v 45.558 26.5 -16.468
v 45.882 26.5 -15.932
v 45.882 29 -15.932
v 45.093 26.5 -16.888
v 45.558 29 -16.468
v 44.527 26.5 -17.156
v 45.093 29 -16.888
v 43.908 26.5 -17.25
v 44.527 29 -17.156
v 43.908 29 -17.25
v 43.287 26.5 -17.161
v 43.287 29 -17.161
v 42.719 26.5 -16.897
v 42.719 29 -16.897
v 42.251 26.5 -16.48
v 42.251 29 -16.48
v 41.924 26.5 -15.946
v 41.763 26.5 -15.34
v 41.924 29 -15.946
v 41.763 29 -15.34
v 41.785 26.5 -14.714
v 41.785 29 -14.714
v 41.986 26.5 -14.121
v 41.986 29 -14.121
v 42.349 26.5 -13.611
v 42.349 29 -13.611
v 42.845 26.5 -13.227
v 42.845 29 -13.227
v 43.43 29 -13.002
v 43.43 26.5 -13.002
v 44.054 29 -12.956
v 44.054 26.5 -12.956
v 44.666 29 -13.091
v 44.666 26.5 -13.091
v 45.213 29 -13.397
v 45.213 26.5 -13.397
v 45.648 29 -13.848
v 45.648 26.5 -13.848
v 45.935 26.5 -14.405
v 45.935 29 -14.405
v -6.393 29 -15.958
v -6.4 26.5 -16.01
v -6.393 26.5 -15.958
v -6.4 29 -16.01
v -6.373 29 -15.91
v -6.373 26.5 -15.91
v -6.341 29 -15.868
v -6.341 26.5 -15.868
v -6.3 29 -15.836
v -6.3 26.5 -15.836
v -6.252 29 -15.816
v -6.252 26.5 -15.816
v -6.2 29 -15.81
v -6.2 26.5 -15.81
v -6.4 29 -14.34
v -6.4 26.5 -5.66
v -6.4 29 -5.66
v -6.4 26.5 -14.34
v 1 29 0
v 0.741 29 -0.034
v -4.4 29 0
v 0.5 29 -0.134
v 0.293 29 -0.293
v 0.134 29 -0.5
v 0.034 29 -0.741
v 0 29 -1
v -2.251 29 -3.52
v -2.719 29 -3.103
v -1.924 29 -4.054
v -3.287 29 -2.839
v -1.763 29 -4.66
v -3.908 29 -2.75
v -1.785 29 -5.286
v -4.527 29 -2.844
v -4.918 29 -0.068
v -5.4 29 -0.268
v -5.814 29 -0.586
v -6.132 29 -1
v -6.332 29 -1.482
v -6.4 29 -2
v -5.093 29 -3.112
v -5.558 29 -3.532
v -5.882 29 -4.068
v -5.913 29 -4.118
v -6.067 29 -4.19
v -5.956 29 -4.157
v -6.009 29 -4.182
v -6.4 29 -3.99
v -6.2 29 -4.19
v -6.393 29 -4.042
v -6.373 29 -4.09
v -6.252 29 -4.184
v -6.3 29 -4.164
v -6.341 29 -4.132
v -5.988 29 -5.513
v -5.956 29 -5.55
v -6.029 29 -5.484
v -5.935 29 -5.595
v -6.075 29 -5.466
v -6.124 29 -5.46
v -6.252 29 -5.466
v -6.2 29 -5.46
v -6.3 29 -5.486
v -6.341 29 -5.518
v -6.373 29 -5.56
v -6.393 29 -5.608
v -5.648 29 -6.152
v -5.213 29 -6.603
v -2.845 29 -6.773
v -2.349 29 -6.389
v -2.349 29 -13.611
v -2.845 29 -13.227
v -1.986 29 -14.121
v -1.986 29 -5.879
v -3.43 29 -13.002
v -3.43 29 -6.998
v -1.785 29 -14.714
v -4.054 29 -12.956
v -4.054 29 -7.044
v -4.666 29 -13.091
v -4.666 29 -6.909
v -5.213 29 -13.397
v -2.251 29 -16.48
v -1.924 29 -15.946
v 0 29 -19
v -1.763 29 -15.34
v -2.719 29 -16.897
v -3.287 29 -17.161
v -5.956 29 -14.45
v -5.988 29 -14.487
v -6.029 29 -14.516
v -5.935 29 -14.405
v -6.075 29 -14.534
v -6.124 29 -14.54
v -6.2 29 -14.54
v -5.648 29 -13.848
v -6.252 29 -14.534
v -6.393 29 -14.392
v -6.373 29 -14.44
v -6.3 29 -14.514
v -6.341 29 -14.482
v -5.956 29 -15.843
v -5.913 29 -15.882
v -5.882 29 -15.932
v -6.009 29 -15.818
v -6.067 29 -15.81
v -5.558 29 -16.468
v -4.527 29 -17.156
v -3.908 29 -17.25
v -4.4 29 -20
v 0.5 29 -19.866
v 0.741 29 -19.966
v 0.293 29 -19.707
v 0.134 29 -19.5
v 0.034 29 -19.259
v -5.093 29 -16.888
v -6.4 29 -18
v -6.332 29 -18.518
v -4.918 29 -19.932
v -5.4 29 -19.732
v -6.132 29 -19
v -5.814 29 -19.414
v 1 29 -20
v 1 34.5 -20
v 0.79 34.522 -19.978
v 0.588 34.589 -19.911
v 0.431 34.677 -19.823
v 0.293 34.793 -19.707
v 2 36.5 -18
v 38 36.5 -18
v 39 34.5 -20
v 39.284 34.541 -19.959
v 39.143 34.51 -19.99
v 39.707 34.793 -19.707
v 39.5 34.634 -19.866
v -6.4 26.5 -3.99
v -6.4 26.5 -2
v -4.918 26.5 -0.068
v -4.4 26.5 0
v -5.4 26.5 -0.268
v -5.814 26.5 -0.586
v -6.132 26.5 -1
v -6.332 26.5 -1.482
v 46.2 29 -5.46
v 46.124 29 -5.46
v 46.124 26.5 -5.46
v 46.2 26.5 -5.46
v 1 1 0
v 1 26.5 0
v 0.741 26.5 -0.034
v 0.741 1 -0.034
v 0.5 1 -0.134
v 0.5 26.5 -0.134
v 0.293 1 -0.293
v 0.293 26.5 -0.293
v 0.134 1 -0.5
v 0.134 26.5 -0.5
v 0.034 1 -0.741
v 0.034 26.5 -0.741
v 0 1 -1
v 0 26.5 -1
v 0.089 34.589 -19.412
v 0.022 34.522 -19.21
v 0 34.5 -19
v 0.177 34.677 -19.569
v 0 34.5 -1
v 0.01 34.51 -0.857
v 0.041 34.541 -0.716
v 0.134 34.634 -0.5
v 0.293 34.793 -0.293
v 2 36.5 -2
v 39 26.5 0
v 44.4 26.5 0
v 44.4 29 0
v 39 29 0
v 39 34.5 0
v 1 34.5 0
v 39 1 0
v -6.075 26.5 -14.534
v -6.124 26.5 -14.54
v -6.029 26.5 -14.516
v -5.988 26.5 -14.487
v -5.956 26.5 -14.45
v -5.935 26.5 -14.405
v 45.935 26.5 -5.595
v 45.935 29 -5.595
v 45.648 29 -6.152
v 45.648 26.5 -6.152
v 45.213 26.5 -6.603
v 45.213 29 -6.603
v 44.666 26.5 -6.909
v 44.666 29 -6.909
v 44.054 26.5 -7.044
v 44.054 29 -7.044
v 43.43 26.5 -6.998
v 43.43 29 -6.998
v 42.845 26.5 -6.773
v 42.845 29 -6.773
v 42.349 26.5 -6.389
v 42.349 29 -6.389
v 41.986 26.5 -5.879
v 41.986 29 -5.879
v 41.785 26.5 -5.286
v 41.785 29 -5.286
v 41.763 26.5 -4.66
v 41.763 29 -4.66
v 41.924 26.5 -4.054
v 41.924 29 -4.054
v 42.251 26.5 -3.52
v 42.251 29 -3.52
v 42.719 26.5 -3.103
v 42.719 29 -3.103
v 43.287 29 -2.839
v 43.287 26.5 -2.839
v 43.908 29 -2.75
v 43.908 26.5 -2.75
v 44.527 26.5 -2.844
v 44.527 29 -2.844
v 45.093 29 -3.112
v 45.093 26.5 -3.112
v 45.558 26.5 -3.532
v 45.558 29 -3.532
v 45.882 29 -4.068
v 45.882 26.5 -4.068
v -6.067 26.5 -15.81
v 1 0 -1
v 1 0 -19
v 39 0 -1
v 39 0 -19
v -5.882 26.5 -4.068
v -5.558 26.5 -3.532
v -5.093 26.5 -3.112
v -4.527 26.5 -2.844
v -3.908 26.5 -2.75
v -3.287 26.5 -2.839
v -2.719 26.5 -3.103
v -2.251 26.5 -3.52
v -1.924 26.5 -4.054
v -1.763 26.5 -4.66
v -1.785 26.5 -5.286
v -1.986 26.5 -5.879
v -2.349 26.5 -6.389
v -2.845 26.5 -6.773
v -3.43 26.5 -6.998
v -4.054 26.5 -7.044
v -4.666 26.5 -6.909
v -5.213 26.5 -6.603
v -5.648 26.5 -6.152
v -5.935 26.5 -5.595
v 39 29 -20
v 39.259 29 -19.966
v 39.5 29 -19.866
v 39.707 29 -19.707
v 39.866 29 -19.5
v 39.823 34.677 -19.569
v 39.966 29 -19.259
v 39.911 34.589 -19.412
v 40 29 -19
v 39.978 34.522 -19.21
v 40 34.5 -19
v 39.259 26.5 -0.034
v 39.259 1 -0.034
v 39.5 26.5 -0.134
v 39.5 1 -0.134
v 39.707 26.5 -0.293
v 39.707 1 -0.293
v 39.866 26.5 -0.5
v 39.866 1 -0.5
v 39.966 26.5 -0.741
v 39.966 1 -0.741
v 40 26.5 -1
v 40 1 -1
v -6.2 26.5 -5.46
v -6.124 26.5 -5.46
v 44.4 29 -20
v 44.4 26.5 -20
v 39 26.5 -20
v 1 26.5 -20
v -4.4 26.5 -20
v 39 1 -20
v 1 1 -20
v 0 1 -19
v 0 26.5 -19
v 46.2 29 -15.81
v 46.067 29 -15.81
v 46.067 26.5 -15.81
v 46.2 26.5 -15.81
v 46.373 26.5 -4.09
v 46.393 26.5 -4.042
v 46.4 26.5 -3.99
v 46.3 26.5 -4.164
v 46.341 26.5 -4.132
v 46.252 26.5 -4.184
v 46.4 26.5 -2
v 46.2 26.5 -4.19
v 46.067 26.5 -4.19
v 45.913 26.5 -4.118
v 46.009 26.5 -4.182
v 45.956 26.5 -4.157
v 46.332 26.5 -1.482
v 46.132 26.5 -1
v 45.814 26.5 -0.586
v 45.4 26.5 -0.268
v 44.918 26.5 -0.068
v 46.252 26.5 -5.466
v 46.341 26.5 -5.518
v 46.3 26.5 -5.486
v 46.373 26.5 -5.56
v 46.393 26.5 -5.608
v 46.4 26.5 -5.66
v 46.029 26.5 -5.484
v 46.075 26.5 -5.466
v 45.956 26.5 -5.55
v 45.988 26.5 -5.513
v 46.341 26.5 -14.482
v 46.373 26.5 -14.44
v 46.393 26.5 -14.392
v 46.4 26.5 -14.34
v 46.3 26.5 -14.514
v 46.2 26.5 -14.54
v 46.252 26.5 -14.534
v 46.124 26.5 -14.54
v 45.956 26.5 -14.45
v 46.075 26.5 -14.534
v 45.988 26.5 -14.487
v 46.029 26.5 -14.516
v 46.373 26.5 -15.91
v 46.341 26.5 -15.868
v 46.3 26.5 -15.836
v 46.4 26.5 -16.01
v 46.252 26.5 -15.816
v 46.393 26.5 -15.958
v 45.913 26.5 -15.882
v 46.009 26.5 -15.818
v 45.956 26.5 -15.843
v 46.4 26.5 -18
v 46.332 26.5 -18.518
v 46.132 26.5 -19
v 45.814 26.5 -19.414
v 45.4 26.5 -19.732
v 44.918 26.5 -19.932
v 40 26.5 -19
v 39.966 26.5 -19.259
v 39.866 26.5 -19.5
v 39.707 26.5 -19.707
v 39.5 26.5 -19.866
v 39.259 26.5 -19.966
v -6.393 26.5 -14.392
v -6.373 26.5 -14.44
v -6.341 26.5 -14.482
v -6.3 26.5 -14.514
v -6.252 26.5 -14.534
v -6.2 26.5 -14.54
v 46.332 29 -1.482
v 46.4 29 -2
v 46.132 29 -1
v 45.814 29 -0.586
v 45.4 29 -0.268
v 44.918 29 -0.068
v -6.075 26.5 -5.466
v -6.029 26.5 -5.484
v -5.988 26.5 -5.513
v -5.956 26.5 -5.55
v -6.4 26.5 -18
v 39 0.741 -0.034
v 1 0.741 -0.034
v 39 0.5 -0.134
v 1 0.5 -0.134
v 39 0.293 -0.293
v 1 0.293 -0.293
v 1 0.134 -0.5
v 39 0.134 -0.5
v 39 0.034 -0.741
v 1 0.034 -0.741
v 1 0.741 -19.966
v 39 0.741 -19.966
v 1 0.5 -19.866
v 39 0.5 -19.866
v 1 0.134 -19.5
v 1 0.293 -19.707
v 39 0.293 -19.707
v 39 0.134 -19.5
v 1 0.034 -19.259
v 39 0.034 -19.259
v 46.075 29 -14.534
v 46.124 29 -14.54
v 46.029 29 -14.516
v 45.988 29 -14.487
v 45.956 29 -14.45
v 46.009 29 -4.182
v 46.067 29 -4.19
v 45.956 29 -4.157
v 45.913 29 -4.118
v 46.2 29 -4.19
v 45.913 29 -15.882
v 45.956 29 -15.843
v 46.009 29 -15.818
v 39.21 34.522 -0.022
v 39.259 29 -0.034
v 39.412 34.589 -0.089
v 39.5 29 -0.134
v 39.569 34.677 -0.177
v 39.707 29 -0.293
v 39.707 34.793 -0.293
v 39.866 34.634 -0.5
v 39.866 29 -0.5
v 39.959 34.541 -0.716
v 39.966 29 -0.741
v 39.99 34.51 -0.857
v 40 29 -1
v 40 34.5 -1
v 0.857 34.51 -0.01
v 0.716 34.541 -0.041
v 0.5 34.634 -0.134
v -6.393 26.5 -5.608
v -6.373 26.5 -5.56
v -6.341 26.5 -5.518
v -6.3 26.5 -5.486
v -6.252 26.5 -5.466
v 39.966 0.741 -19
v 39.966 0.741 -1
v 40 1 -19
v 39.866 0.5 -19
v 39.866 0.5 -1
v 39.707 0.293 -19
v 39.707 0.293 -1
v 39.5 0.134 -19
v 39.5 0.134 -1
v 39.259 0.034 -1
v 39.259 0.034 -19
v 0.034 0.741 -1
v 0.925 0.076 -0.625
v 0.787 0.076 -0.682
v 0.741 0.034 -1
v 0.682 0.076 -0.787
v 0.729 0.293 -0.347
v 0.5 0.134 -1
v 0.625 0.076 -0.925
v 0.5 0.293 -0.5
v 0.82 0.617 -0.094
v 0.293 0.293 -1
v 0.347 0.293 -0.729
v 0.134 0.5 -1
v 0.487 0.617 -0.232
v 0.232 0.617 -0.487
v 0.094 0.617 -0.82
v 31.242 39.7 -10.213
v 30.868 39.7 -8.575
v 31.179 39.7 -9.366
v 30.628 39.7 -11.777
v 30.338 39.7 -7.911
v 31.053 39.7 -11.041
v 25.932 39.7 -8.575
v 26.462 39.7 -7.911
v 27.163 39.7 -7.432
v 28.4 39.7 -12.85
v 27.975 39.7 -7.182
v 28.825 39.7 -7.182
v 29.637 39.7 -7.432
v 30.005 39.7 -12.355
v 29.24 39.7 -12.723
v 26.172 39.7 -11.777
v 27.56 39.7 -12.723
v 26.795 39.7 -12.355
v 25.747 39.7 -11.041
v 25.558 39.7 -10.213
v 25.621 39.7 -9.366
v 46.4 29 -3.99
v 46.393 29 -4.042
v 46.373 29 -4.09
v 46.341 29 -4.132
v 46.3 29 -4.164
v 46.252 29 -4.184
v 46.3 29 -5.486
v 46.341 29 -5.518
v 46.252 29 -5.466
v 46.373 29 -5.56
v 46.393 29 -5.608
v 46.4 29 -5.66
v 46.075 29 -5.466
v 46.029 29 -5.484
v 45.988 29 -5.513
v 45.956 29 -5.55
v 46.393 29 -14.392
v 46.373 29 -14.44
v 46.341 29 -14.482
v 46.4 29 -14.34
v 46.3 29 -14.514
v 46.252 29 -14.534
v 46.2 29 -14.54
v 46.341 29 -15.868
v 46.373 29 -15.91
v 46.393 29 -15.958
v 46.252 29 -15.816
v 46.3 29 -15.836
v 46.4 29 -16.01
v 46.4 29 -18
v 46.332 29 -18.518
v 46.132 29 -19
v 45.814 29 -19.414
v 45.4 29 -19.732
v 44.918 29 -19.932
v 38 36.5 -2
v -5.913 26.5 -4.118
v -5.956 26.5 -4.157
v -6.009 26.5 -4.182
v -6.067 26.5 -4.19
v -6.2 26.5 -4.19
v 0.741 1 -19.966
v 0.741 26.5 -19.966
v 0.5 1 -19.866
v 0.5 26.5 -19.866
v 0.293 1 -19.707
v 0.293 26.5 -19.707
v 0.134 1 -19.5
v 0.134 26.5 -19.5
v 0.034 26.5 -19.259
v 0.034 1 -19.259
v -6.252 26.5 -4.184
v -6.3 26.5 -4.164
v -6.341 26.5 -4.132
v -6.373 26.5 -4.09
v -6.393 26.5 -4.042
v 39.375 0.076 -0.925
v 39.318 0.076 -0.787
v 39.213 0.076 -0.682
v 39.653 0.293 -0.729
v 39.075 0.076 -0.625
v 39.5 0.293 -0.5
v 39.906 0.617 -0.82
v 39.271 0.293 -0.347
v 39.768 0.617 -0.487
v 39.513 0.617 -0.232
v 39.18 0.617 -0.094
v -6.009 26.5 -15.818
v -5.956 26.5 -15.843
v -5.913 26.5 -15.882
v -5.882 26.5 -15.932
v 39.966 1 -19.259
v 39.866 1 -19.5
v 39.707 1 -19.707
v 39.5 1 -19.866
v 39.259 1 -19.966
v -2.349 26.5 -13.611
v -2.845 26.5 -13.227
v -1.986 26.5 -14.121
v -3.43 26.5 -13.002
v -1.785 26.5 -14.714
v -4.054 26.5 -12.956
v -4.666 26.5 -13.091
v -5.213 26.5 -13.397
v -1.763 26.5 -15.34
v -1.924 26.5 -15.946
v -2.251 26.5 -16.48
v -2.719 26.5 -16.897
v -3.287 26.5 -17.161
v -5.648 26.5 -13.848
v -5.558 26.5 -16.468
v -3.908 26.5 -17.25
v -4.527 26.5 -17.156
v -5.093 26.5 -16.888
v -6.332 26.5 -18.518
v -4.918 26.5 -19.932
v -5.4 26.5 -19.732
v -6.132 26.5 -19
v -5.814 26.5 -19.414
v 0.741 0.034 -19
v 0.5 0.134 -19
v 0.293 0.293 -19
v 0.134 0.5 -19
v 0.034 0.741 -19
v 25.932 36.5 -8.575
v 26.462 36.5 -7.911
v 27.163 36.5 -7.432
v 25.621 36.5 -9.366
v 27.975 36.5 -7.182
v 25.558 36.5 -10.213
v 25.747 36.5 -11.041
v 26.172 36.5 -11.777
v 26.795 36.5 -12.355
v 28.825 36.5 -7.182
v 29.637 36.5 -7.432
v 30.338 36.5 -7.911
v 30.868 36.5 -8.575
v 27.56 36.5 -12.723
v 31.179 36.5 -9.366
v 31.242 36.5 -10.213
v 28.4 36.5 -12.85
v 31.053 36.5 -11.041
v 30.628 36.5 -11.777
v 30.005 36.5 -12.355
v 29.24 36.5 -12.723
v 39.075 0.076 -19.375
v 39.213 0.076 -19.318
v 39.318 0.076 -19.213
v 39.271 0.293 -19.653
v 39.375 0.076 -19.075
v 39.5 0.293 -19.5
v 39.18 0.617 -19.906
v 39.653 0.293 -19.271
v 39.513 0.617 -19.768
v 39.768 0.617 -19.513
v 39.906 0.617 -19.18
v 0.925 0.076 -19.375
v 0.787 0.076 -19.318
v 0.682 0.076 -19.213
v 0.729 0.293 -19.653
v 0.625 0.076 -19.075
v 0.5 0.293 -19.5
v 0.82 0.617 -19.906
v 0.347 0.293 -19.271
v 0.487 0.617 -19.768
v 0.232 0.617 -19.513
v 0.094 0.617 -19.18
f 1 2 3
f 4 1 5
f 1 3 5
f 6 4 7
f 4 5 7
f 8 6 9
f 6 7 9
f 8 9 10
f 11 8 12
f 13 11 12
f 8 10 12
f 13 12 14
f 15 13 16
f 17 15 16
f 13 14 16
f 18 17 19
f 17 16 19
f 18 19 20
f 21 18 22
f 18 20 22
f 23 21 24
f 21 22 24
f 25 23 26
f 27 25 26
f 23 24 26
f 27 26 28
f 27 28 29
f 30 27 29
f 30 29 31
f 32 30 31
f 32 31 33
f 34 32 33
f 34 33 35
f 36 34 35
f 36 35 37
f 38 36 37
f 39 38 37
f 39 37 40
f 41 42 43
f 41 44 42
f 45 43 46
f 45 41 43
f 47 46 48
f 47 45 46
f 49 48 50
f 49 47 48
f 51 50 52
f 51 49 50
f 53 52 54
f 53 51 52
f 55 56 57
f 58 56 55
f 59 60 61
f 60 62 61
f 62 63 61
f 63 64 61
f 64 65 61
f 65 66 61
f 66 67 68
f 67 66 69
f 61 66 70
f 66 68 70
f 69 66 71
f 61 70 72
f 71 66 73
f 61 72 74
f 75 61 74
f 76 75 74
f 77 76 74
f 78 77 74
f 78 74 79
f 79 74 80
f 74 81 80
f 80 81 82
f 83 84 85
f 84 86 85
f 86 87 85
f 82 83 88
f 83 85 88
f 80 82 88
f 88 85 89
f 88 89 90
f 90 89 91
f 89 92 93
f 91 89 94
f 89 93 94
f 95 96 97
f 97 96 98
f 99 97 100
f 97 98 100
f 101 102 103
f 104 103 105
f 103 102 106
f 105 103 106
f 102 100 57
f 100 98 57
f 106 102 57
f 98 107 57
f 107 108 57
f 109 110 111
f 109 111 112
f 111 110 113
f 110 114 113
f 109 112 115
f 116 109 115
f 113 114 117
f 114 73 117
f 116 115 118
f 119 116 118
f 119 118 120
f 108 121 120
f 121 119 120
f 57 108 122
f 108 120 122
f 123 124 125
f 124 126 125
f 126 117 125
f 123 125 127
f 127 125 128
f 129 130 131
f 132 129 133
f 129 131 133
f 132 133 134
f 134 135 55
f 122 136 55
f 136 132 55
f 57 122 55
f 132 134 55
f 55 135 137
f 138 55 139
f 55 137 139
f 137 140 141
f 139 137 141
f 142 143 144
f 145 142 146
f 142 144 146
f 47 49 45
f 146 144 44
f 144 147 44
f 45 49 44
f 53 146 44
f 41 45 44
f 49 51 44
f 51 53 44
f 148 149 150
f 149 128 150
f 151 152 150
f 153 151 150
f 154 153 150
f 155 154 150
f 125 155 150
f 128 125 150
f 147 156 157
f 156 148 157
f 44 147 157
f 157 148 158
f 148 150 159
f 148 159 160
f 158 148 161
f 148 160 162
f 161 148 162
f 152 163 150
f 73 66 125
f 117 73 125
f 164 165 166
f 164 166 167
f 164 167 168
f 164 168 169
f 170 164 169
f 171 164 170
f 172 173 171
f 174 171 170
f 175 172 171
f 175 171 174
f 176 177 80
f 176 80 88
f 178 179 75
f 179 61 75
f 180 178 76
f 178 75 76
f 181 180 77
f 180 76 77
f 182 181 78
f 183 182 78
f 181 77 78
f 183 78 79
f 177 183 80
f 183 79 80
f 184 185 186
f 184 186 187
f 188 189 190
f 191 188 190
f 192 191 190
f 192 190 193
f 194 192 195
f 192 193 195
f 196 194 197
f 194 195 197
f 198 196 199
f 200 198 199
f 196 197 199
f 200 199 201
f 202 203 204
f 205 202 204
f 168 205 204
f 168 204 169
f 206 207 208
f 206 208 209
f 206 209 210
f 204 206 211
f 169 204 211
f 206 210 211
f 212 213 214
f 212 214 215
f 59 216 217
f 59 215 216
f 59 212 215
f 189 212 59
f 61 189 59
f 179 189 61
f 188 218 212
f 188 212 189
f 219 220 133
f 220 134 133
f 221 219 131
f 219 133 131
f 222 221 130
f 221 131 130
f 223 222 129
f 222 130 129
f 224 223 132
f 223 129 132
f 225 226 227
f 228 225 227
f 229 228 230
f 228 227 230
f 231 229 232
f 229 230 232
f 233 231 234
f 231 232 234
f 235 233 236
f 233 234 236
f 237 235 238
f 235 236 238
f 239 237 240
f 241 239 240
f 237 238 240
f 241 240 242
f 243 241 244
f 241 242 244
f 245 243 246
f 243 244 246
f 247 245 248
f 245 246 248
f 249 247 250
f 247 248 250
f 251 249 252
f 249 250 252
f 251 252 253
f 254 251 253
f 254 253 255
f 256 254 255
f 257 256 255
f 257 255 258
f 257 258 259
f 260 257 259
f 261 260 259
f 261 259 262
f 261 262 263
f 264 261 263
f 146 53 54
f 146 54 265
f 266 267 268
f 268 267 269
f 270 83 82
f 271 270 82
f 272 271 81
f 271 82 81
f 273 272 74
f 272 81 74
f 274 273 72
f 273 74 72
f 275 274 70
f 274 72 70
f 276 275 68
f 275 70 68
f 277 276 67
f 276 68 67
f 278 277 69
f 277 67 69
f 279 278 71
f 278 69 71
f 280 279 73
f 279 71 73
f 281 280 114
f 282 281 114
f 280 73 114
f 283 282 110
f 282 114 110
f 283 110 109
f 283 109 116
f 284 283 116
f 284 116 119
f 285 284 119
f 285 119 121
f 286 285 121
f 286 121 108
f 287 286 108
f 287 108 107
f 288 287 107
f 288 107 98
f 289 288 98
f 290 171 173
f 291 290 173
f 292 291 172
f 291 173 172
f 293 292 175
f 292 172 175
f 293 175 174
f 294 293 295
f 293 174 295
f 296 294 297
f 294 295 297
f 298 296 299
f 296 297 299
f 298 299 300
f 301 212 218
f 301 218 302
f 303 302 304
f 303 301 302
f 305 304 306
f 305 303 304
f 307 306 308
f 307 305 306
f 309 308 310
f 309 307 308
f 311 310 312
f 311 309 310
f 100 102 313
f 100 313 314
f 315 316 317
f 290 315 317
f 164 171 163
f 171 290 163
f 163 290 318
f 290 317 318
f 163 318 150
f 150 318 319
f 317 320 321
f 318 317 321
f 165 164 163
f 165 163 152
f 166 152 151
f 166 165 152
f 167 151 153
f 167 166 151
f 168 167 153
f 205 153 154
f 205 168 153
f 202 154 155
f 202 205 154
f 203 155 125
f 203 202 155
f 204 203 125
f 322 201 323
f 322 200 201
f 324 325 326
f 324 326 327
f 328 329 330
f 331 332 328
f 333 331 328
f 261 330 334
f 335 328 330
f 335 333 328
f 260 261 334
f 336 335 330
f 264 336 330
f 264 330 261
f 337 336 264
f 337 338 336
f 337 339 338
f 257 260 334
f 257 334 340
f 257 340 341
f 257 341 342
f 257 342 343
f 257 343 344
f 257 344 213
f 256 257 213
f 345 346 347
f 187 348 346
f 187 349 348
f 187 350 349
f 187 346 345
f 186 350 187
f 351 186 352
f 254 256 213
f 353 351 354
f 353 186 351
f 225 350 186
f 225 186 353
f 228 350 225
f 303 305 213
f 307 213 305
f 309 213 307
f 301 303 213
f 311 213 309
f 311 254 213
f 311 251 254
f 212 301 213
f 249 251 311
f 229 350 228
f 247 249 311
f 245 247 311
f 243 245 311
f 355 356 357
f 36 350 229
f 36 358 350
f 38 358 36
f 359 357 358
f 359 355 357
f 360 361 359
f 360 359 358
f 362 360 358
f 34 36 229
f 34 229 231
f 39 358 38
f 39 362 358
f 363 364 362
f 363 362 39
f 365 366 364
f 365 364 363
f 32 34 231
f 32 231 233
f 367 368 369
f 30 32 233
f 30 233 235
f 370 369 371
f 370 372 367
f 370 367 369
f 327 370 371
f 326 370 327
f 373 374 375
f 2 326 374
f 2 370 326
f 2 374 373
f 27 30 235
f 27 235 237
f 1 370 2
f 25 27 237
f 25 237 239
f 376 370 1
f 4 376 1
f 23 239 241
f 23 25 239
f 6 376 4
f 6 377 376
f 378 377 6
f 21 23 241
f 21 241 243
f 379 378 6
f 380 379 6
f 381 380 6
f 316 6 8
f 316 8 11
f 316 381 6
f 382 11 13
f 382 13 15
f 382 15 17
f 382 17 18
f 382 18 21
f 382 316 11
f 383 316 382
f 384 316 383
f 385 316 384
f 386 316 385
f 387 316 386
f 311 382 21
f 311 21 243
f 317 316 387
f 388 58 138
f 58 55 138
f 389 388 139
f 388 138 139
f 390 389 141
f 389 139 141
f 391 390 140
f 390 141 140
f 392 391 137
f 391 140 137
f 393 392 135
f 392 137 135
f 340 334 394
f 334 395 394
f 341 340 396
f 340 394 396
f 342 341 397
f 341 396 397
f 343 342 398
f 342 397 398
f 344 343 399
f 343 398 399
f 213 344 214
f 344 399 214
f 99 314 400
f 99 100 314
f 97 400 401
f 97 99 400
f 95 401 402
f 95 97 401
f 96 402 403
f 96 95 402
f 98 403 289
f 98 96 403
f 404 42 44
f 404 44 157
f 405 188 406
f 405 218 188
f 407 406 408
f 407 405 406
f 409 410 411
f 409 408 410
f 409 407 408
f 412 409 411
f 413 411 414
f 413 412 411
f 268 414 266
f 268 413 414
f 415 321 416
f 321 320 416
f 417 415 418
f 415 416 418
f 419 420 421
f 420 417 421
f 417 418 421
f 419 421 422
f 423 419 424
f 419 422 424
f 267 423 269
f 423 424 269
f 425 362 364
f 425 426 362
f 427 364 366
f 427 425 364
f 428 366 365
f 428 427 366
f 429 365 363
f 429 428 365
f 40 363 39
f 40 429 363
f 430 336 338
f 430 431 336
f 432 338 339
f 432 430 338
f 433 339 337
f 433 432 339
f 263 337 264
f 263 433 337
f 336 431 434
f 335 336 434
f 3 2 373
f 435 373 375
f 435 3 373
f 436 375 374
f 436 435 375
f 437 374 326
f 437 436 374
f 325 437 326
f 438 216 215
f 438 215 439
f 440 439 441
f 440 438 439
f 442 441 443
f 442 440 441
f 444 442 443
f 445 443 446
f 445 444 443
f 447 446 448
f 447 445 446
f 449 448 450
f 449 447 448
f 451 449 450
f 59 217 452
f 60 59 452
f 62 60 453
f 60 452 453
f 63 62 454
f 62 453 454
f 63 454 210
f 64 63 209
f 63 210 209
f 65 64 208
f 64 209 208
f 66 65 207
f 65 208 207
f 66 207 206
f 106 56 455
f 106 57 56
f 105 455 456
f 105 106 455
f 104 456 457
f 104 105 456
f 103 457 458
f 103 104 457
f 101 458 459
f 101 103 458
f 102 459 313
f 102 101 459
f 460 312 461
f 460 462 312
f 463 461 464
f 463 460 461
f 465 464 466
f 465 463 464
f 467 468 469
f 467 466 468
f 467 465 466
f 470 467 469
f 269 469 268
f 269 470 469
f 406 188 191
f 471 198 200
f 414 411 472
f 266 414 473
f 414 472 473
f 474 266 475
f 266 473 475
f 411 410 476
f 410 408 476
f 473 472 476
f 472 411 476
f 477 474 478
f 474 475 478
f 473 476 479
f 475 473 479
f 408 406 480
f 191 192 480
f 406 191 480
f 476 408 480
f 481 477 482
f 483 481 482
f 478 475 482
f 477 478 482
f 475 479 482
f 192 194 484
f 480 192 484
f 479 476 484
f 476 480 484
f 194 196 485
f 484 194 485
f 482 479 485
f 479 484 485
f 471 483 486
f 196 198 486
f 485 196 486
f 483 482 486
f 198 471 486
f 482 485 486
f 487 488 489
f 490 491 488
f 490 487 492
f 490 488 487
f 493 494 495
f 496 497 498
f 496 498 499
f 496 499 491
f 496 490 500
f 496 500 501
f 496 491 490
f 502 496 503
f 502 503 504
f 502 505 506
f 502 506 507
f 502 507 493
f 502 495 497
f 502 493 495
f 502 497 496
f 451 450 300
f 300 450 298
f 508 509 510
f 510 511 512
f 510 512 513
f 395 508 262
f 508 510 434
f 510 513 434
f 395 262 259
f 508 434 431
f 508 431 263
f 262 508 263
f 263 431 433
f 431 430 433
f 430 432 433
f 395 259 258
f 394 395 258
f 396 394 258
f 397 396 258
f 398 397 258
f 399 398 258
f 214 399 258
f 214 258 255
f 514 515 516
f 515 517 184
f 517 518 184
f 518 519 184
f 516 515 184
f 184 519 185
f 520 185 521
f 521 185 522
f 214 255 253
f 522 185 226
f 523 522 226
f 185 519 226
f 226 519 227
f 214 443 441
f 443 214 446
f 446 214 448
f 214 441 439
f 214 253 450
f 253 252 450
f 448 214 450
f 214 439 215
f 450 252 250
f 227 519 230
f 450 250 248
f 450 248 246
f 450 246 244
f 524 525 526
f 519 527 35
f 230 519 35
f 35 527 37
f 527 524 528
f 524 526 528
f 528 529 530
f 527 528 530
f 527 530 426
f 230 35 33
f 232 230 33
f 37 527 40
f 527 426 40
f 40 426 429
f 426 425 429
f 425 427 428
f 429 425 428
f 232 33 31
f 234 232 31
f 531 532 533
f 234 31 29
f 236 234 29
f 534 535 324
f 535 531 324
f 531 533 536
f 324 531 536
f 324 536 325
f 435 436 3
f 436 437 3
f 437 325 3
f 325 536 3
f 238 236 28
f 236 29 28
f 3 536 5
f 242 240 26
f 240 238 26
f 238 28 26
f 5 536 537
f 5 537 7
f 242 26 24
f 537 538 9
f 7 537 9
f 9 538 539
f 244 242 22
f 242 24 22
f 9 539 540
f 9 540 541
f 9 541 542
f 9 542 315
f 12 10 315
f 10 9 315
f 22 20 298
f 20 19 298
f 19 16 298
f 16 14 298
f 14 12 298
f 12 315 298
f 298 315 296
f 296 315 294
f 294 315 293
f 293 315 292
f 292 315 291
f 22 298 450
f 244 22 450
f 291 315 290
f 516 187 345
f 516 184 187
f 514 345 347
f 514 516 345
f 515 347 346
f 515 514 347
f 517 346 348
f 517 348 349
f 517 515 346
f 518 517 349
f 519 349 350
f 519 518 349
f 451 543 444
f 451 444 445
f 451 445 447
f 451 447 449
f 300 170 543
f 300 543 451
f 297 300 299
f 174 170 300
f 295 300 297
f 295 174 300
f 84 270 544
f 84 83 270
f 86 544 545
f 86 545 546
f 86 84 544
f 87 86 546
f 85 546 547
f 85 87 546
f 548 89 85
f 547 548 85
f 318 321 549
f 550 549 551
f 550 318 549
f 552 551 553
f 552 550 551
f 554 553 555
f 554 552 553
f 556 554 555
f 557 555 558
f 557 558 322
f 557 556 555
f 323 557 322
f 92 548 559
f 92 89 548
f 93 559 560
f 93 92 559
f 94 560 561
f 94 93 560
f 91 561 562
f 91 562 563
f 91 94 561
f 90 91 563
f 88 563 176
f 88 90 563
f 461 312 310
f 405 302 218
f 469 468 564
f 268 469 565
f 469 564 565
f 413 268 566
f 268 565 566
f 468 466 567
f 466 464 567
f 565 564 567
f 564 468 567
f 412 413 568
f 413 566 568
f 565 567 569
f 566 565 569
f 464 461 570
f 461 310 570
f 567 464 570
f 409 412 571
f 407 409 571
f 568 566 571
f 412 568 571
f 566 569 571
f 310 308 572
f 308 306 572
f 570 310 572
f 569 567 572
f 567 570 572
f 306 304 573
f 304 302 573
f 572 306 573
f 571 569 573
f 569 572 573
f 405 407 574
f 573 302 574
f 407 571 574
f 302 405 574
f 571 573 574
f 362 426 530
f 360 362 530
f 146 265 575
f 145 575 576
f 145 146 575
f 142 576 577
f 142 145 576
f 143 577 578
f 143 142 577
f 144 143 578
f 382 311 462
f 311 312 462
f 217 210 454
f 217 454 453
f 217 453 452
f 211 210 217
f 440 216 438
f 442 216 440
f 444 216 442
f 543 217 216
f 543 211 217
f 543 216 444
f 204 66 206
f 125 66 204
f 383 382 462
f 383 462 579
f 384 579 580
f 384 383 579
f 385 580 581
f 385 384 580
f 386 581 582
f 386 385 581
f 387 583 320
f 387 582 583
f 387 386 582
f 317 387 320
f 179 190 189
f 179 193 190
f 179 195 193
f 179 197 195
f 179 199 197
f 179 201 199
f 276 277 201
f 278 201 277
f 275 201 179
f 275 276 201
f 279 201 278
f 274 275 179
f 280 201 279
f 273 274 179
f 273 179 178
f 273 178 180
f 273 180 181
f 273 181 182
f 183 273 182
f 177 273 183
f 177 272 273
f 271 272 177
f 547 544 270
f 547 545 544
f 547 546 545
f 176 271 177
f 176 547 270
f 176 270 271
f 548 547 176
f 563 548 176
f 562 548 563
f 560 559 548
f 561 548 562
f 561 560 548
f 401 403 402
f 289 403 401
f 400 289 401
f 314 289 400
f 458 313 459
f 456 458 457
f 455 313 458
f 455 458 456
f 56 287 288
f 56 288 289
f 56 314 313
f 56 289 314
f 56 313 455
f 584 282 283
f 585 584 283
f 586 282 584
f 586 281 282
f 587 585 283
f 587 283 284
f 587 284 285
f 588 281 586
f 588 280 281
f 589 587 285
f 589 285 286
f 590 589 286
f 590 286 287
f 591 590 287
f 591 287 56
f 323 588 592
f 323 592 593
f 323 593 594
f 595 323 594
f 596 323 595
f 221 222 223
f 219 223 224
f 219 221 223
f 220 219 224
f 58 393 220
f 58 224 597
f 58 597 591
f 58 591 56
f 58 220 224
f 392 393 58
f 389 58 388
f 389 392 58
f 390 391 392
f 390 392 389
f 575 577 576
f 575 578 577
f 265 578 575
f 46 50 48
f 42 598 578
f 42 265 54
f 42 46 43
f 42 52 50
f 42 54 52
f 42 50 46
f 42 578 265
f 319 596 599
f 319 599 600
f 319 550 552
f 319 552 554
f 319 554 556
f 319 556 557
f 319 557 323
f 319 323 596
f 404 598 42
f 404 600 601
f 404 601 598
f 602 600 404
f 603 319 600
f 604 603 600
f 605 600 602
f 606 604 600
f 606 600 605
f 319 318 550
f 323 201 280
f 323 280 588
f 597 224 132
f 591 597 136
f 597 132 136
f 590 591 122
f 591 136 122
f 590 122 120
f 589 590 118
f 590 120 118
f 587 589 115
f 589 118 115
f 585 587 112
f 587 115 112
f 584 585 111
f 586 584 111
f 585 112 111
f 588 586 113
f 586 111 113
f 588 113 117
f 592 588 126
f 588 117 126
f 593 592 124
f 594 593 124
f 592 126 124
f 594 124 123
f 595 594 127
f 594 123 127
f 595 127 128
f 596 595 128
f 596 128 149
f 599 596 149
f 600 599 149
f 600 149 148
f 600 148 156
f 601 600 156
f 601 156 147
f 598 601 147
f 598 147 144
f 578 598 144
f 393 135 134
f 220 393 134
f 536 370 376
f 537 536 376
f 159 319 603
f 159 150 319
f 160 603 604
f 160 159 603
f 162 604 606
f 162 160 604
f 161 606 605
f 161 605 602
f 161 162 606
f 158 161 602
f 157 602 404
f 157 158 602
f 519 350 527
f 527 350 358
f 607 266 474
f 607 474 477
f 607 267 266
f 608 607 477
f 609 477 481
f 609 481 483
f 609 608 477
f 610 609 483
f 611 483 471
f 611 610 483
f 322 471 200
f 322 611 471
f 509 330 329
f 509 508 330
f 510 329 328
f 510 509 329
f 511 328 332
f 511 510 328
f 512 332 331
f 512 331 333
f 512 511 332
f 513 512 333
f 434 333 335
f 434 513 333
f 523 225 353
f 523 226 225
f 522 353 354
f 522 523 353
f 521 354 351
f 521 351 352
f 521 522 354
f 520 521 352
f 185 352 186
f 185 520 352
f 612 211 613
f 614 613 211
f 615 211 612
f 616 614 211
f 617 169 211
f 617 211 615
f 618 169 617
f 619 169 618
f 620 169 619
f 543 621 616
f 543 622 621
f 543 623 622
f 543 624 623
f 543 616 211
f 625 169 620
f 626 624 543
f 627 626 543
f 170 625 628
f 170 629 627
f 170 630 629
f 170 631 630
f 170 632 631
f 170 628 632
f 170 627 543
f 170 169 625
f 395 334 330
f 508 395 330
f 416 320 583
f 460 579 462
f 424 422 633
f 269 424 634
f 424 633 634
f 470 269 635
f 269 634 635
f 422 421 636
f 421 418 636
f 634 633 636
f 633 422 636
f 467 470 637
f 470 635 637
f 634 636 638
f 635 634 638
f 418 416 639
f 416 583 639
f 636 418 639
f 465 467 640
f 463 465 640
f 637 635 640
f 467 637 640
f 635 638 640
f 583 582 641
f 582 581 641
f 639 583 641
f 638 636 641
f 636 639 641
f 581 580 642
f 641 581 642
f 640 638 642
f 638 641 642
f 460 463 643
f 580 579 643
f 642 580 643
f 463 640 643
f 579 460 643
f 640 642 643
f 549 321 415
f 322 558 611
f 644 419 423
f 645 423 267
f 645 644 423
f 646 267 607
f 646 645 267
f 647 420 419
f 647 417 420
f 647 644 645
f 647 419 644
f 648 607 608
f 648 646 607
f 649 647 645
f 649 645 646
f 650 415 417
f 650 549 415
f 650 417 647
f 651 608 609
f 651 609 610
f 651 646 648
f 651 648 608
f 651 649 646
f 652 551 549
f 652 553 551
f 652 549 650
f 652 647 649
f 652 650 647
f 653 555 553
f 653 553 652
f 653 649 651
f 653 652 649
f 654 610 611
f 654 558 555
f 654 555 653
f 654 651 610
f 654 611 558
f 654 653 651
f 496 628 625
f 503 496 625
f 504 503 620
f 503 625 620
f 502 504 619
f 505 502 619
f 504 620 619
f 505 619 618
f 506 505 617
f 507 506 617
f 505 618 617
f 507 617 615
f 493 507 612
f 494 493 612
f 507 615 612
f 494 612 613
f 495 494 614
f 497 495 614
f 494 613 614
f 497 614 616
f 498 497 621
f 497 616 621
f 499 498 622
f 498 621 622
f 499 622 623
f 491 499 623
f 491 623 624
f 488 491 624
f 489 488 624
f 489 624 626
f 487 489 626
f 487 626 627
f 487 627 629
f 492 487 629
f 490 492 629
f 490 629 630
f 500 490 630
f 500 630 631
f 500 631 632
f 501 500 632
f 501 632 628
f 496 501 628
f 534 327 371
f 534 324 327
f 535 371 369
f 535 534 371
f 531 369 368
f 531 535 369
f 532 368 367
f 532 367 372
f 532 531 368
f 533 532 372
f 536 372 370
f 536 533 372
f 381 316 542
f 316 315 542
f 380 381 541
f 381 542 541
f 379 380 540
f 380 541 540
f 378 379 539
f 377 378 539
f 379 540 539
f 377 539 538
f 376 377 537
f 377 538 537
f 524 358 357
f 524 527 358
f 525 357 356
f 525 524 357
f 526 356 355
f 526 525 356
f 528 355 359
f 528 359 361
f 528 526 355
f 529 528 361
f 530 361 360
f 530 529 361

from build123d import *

# Parameters (mm, degrees)
SKETCH_1_W           = 40
SKETCH_1_H           = 20
EXTRUDE_1_DEPTH      = 36.5
SKETCH_2_W           = 52.8
SKETCH_2_H           = 20
EXTRUDE_2_DEPTH      = 2.5
SKETCH_3_R           = 2.15
CUT_EXTRUDE_1_DEPTH  = 4.15
SKETCH_4_W           = 1.589858097
SKETCH_4_H           = 1.269072198
CUT_EXTRUDE_2_DEPTH  = 4.15
FILLET_2_R           = 2
FILLET_3_R           = 1
FILLET_7_R           = 0.2
FILLET_8_R           = 0.2
FILLET_START         = 38.537319575
FILLET_3_2_OUTLINE_W = 42
FILLET_3_2_OUTLINE_H = 6
FILLET_3_2_DEPTH     = 2.462680425
FILLET_START_2       = 24.395183951
FILLET_4_OUTLINE_W   = 42
FILLET_4_OUTLINE_H   = 6
FILLET_4_DEPTH       = 2.604816049
FILLET_START_3       = 52.679455198
FILLET_5_OUTLINE_W   = 5
FILLET_5_OUTLINE_H   = 22
FILLET_5_DEPTH       = 2.320544802
FILLET_START_4       = -27
FILLET_6_OUTLINE_W   = 6
FILLET_6_OUTLINE_H   = 22
FILLET_6_DEPTH       = 2.604816049
SKETCH_5_R           = 2.85
EXTRUDE_3_DEPTH      = 5
CUT_EXTRUDE_START    = -1.8
SKETCH_6_R           = 2.85
CUT_EXTRUDE_3_DEPTH  = 1.8


with BuildPart() as part:
    # 草图1 → 凸台-拉伸1 (new body)
    with BuildSketch(Plane(origin=(0, 0, 0), x_dir=(1, 0, 0), z_dir=(0, 1, 0))):
        with Locations((20, 10)):
            Rectangle(SKETCH_1_W, SKETCH_1_H)
    extrude(amount=EXTRUDE_1_DEPTH)

    # 草图2 → 凸台-拉伸2 (add)
    with BuildSketch(Plane(origin=(0, 26.5, 0), x_dir=(-1, 0, 0), z_dir=(0, -1, 0))):
        with Locations((-20, 10)):
            Rectangle(SKETCH_2_W, SKETCH_2_H)
    extrude(amount=-EXTRUDE_2_DEPTH)

    # 草图3 → 切除-拉伸1 (cut)
    with BuildSketch(Plane(origin=(0, 29, 0), x_dir=(1, 0, 0), z_dir=(0, 1, 0))):
        with Locations(Location((43.9, 15.1, 0), (0, 0, 270))):
            Circle(SKETCH_3_R)
        with Locations(Location((43.9, 4.9, 0), (0, 0, 270))):
            Circle(SKETCH_3_R)
        with Locations(Location((-3.9, 15.1, 0), (0, 0, 270))):
            Circle(SKETCH_3_R)
        with Locations(Location((-3.9, 4.9, 0), (0, 0, 270))):
            Circle(SKETCH_3_R)
    extrude(amount=-CUT_EXTRUDE_1_DEPTH, mode=Mode.SUBTRACT)

    # 草图4 → 切除-拉伸2 (cut)
    with BuildSketch(Plane(origin=(0, 29, 0), x_dir=(1, 0, 0), z_dir=(0, 1, 0))):
        with Locations((-6.117219692, 15.174989867)):
            Rectangle(SKETCH_4_W, SKETCH_4_H)
        with Locations((46.117219692, 15.174989867)):
            Rectangle(SKETCH_4_W, SKETCH_4_H)
        with Locations((46.117219692, 4.825010133)):
            Rectangle(SKETCH_4_W, SKETCH_4_H)
        with Locations((-6.117219692, 4.825010133)):
            Rectangle(SKETCH_4_W, SKETCH_4_H)
    extrude(amount=-CUT_EXTRUDE_2_DEPTH, mode=Mode.SUBTRACT)

    # 圆角2
    fillet_2_edges = [part.edges().sort_by_distance(p)[0] for p in [
        (46.4, 27.75, -20),
        (-6.4, 27.75, 0),
        (46.4, 27.75, 0),
        (-6.4, 27.75, -20),
    ]]
    fillet(fillet_2_edges, radius=FILLET_2_R)

    # Fillet 3
    fillet_3_edges = [part.edges().sort_by_distance(p)[0] for p in [
        (0, 13.25, -20),
        (40, 13.25, -20),
        (40, 13.25, 0),
        (0, 13.25, 0),
        (20, 0, -20),
        (40, 0, -10),
        (20, 0, 0),
        (0, 0, -10),
        (0, 32.75, -20),
        (40, 32.75, -20),
        (40, 32.75, 0),
        (0, 32.75, 0),
    ]]
    fillet(fillet_3_edges, radius=FILLET_3_R)

    # 圆角7
    fillet_7_edges = [part.edges().sort_by_distance(p)[0] for p in [
        (46.4, 27.75, -4.190474034),
        (46.4, 27.75, -5.459546232),
        (45.97591137, 27.75, -5.459546232),
        (45.929549926, 27.75, -4.190474034),
        (45.97591137, 27.75, -14.540453768),
        (45.929549926, 27.75, -15.809525966),
        (-5.97591137, 27.75, -5.459546232),
        (-5.929549926, 27.75, -4.190474034),
        (46.4, 27.75, -15.809525966),
        (46.4, 27.75, -14.540453768),
        (-6.4, 27.75, -4.190474034),
        (-6.4, 27.75, -5.459546232),
    ]]
    fillet(fillet_7_edges, radius=FILLET_7_R)

    # 圆角8
    fillet_8_edges = [part.edges().sort_by_distance(p)[0] for p in [
        (-6.4, 27.75, -14.540453768),
        (-6.4, 27.75, -15.809525966),
        (-5.929549926, 27.75, -15.809525966),
        (-5.97591137, 27.75, -14.540453768),
    ]]
    fillet(fillet_8_edges, radius=FILLET_8_R)

    # Fillet 3 2: read off the stored shape, not the designer's step
    # Fillet 3 2 outline → Fillet 3 2 (cut)
    with BuildSketch(Plane(origin=(0, 0, 0), x_dir=(1, 0, 0), z_dir=(0, 0.707106781186547, -0.707106781186548)).offset(FILLET_START)):
        with Locations((20, -12)):
            Rectangle(FILLET_3_2_OUTLINE_W, FILLET_3_2_OUTLINE_H)
    extrude(amount=FILLET_3_2_DEPTH, mode=Mode.SUBTRACT)

    # 倒角4: read off the stored shape, not the designer's step
    # 倒角4 outline → 倒角4 (cut)
    with BuildSketch(Plane(origin=(0, 0, 0), x_dir=(1, 0, 0), z_dir=(0, 0.707106781186547, 0.707106781186548)).offset(FILLET_START_2)):
        with Locations((20, 26)):
            Rectangle(FILLET_4_OUTLINE_W, FILLET_4_OUTLINE_H)
    extrude(amount=FILLET_4_DEPTH, mode=Mode.SUBTRACT)

    # 倒角5: read off the stored shape, not the designer's step
    # 倒角5 outline → 倒角5 (cut)
    with BuildSketch(Plane(origin=(0, 0, 0), x_dir=(0.707106781186546, -0.707106781186549, 0), z_dir=(0.707106781186549, 0.707106781186546, 0)).offset(FILLET_START_3)):
        with Locations((2.5, 10)):
            Rectangle(FILLET_5_OUTLINE_W, FILLET_5_OUTLINE_H)
    extrude(amount=FILLET_5_DEPTH, mode=Mode.SUBTRACT)

    # 倒角6: read off the stored shape, not the designer's step
    # 倒角6 outline → 倒角6 (cut)
    with BuildSketch(Plane(origin=(0, 0, 0), x_dir=(0.7071067811865471, 0.707106781186548, 0), z_dir=(0.707106781186548, -0.707106781186547, 0)).offset(FILLET_START_4)):
        with Locations((26, -10)):
            Rectangle(FILLET_6_OUTLINE_W, FILLET_6_OUTLINE_H)
    extrude(amount=FILLET_6_DEPTH, mode=Mode.SUBTRACT)

    # 草图5 → 凸台-拉伸3 (add)
    with BuildSketch(Plane(origin=(0, 36.5, 0), x_dir=(1, 0, 0), z_dir=(0, 1, 0))):
        with Locations(Location((28.4, 10, 0), (0, 0, 90))):
            Circle(SKETCH_5_R)
    extrude(amount=EXTRUDE_3_DEPTH)

    # 草图6 → 切除-拉伸3 (cut)
    with BuildSketch(Plane(origin=(0, 41.5, 0), x_dir=(1, 0, 0), z_dir=(0, 1, 0)).offset(CUT_EXTRUDE_START)):
        with Locations(Location((28.4, 10, 0), (0, 0, 90))):
            Circle(SKETCH_6_R)
    extrude(amount=CUT_EXTRUDE_3_DEPTH, mode=Mode.SUBTRACT)


solid = part.part
